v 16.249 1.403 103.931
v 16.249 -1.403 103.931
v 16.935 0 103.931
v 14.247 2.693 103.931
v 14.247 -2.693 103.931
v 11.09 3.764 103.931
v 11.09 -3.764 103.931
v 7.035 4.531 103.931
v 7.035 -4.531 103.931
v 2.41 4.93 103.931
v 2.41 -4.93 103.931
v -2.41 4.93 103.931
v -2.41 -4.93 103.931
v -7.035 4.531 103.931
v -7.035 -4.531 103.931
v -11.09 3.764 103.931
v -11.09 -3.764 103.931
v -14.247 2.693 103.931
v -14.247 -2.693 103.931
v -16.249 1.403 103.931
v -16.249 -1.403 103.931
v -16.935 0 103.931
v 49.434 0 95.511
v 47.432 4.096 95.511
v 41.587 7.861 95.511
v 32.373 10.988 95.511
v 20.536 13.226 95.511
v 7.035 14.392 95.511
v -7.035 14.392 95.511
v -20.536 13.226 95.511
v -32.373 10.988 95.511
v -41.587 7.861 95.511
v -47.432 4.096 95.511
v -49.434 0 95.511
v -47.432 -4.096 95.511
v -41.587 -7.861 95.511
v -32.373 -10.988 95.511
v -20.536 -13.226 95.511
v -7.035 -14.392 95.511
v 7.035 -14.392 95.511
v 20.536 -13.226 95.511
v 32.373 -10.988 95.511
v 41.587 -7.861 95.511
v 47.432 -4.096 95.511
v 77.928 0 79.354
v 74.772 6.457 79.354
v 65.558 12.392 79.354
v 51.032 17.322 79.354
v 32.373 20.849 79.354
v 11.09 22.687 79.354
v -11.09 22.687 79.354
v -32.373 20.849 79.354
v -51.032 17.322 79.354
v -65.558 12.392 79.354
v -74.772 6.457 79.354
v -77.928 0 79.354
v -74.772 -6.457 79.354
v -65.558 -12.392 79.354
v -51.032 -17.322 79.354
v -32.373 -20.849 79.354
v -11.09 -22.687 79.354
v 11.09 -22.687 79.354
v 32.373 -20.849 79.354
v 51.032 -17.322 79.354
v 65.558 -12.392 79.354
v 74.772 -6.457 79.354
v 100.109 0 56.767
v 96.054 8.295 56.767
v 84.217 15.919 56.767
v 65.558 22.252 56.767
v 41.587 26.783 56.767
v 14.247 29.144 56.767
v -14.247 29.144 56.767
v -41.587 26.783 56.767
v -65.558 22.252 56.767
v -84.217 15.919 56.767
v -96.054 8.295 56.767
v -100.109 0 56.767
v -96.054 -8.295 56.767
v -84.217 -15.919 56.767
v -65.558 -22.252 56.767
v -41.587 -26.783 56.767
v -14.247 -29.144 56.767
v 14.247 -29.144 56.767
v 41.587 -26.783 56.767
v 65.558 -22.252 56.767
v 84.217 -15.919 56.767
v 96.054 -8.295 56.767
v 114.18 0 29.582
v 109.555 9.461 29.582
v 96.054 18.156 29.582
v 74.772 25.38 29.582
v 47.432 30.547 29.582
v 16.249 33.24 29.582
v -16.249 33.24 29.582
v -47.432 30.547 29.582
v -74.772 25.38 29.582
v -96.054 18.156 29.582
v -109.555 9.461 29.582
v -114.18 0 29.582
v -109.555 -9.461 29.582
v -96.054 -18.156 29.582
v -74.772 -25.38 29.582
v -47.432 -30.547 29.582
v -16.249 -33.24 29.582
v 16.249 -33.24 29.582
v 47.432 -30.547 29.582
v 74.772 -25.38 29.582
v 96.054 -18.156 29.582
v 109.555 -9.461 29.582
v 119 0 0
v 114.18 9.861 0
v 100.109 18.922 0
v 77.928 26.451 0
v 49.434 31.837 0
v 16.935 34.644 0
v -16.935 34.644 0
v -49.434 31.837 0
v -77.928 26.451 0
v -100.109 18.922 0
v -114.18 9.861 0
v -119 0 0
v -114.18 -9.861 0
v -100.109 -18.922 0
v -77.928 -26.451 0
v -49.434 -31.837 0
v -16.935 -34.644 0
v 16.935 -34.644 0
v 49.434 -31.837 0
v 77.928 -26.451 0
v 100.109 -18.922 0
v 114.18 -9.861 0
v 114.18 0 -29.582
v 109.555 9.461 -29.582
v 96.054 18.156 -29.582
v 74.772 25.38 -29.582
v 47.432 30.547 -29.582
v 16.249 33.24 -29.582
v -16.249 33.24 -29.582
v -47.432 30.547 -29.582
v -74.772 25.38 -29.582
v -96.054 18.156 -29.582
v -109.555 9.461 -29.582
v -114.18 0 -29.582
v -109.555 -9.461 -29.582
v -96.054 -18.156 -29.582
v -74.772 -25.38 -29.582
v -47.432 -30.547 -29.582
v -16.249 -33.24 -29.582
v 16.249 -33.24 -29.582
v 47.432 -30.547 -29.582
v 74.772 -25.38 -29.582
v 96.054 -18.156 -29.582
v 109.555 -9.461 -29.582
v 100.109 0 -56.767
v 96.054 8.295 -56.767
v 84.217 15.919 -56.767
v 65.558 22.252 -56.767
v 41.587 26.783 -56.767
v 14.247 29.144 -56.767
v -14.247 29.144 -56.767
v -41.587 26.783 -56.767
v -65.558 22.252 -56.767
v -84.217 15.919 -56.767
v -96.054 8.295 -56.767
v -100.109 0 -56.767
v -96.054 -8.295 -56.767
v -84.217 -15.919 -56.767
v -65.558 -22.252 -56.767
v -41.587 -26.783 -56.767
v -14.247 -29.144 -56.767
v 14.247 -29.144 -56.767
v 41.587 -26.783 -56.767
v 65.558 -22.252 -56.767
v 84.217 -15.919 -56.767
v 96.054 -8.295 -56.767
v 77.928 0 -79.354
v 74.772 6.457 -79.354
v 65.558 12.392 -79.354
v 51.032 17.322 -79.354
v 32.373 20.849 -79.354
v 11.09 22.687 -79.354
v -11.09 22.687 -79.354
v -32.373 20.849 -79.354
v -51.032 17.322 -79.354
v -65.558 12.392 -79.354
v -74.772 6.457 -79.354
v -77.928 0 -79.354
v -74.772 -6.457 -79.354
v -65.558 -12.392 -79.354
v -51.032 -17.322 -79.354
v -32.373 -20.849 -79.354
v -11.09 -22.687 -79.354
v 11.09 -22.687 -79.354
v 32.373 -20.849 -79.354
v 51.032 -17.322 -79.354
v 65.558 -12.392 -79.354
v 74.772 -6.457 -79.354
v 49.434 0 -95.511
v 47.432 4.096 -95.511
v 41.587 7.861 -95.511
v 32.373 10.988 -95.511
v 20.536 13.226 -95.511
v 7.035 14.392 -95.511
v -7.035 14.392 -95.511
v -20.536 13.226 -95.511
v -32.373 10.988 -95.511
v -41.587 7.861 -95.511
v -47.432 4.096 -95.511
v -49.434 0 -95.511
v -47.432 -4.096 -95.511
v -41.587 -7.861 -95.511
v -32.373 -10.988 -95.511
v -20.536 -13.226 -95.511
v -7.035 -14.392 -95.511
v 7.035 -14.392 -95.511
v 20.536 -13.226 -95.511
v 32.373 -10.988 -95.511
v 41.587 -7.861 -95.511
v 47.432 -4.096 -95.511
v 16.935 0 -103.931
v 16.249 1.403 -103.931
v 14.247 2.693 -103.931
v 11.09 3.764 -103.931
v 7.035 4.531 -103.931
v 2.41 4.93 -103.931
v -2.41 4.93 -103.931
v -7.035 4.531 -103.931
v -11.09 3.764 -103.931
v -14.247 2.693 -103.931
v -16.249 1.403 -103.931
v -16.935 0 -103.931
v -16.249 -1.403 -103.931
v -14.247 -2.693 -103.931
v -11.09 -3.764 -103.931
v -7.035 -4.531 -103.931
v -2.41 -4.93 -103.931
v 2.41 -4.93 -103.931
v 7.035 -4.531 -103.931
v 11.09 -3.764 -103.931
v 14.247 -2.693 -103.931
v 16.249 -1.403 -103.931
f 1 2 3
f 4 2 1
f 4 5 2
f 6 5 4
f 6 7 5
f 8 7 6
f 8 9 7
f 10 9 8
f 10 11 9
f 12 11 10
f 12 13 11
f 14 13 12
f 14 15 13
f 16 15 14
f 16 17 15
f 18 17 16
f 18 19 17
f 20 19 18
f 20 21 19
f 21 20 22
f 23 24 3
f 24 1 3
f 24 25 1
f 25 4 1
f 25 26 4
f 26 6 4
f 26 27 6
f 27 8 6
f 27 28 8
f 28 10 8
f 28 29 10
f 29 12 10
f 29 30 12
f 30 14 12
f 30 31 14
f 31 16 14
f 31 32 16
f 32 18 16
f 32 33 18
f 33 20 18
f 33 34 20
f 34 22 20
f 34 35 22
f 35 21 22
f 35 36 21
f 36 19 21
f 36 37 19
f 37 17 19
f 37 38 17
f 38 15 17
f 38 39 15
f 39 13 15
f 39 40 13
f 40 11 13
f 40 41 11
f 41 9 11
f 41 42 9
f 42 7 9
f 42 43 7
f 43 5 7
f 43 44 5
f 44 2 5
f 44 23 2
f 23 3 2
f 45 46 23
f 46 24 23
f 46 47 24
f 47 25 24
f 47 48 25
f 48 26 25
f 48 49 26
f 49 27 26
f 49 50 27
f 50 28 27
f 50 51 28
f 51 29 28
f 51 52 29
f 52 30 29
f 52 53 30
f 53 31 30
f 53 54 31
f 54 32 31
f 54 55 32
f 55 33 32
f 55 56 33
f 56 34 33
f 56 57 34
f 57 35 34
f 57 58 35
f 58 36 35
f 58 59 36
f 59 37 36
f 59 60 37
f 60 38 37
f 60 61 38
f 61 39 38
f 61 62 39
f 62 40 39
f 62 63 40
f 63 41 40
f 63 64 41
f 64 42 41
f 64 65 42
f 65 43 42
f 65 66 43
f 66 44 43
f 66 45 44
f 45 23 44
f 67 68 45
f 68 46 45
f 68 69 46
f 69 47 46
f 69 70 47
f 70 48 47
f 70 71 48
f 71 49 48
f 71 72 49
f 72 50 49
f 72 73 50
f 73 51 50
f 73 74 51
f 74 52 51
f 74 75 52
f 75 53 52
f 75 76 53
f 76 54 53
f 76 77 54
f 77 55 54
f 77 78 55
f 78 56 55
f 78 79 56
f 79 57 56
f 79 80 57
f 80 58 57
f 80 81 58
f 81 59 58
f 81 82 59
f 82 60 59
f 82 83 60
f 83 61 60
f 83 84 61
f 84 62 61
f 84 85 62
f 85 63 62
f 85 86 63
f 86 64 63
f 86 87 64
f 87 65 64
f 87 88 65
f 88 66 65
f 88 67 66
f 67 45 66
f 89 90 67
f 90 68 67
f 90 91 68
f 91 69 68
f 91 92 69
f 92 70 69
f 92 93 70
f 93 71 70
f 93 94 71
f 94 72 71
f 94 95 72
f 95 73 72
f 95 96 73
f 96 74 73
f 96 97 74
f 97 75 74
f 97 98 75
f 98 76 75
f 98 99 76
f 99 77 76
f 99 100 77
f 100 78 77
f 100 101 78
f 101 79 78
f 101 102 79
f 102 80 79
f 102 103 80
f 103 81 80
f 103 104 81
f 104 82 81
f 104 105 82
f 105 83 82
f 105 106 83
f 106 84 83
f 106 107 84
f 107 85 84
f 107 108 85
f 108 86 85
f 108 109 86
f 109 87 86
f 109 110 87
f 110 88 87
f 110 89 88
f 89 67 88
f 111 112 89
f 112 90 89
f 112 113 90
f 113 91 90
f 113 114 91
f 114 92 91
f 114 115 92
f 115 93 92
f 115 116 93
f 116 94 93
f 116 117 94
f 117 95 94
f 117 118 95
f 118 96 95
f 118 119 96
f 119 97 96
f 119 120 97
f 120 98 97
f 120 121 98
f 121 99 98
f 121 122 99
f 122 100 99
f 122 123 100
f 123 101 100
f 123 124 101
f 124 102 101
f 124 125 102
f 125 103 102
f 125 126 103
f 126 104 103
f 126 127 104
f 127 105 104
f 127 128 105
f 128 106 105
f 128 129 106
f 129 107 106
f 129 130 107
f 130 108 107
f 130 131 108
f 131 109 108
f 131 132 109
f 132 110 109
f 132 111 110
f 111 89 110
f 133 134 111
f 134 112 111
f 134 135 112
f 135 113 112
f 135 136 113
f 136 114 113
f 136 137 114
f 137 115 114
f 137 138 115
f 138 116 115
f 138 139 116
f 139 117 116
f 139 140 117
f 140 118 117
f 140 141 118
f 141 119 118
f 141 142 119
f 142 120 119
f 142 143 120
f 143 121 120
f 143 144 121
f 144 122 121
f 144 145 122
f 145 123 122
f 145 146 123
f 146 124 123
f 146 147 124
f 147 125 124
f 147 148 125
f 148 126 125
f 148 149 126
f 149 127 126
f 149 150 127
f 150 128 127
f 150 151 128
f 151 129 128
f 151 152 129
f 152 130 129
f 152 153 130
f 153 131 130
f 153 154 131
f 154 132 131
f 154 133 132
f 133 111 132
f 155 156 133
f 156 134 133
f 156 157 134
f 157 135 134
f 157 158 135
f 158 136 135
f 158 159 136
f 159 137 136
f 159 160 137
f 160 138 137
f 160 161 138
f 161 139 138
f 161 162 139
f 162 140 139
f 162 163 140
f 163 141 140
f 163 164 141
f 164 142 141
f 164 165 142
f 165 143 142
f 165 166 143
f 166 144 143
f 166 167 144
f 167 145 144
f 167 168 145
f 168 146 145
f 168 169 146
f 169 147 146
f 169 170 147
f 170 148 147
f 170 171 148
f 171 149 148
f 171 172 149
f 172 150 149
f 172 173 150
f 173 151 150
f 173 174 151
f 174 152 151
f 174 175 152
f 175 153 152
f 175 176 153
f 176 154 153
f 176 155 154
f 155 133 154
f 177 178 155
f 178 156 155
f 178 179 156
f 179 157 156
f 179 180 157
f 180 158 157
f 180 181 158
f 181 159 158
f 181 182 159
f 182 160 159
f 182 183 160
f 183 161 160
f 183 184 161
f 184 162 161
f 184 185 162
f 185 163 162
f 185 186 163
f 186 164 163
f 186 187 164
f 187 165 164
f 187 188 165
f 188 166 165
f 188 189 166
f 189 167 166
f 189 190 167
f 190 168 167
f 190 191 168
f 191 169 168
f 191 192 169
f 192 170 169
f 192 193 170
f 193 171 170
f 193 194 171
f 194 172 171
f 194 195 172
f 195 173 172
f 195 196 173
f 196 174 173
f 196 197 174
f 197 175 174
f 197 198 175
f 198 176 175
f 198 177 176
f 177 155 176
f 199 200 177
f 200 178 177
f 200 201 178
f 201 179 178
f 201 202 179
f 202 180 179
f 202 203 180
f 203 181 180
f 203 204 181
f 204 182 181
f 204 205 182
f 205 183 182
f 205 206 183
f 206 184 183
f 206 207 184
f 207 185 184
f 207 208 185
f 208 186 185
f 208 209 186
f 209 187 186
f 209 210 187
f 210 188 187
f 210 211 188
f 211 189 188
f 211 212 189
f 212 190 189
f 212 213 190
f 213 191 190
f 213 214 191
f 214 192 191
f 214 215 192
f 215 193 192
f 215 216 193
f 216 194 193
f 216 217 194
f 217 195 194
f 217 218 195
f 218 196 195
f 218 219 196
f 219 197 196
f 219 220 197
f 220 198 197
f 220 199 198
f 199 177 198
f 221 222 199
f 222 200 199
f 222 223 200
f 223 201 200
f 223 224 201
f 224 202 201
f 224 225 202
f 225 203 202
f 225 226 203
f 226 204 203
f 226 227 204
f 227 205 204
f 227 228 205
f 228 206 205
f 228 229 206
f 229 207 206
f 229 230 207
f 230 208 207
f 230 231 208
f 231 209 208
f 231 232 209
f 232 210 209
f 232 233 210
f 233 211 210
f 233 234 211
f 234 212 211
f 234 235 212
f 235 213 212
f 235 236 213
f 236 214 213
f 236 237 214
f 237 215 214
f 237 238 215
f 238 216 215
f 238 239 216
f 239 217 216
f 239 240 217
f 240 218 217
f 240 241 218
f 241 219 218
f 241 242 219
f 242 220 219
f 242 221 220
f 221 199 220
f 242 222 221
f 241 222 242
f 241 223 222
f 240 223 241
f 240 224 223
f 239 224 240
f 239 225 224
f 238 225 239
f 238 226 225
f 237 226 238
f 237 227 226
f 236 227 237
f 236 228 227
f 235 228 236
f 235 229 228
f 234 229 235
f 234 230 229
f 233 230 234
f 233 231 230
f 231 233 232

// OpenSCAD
// Generated by SolidPython 1.0.1 on 2020-07-29 00:46:52


scale(v = [17, 5, 15]) {
	sphere(r = 7);
}
/***********************************************
*********      SolidPython code:      **********
************************************************
 
# import packages: SolidPython
from solid import *
from solid.utils import *
from itertools import chain, combinations, permutations


class Resize:

    def __init__(self, scad_file):
        self.scad_file = scad_file
        #self.scad_file = import_scad(scad_file)
        # cone/cylinder param:
        self.r1 = 0
        self.r2 = 0
        self.h = 0
        # rectangular prism param:
        self.w = 0
        self.l = 0
        # ellipse param:
        self.r = 0

    # import OpenScad code (file name corresponds to shape)


    # classify shape + parameters
    def assign(self, param1, param2, param3):
        if self.scad_file == 'cone.scad':
            self.r1 = param1
            self.r2 = param2
            self.h = param3
        elif self.scad_file == 'cylinder.scad':
            self.r1 = param1
            self.r2 = param2
            self.h = param3
        elif self.scad_file == 'rectangularPrism.scad':
            self.h = param1
            self.l = param2
            self.w = param3
        else:
            self.r = param1
            self.h = param2

    # resize parameters
    def iterate(self):
        x = range(3, 20, 2)
        i = 1
        if self.scad_file == 'cone.scad':
            tempList = list(permutations(x, 2))
            for temp in tempList:
                param1 = temp[0]
                param2 = temp[1]
                filepath = 'produced_scad_files/' + 'cone' + str(param1) + '_' + str(param2) + '_' + '.scad'
                scad_render_to_file(cylinder(h=param1, r1=param2, r2=0), filepath)

        elif self.scad_file == 'cylinder.scad':
            tempList = list(permutations(x, 3))
            for temp in tempList:
                param1 = temp[0]
                param2 = temp[1]
                filepath = 'produced_scad_files/' + 'cylinder' + str(param1) + '_' + str(param2) + '_' + '.scad'
                scad_render_to_file(cylinder(h=param1, r1=param2, r2=param2), filepath)

        elif self.scad_file == 'rectangularPrism.scad':
            tempList = list(permutations(x, 3))
            for temp in tempList:
                param1 = temp[0]
                param2 = temp[1]
                param3 = temp[2]
                filepath = 'produced_scad_files/' + 'rectangularPrism' + str(param1) + '_' + str(param2) + '_' + str(
                    param3) + '.scad'
                scad_render_to_file(cube(size=(param1, param2, param3)), filepath)

        elif self.scad_file == 'ellipse.scad':
            tempList = list(permutations(x, 4))
            for temp in tempList:
                param1 = temp[0]
                param2 = temp[1]
                param3 = temp[2]
                param4 = temp[3]
                filepath = 'produced_scad_files/' + 'ellipse' + str(param1) + '_' + str(param2) + '_' + str(param3) + '_' + str(param4) + '.scad'
                scad_render_to_file(scale([param1, param2, param3])(sphere(r=param4)), filepath)

    def render_to_scadfile(self):
        scad_render_to_file(scad, 'example.scad') 
 
************************************************/
